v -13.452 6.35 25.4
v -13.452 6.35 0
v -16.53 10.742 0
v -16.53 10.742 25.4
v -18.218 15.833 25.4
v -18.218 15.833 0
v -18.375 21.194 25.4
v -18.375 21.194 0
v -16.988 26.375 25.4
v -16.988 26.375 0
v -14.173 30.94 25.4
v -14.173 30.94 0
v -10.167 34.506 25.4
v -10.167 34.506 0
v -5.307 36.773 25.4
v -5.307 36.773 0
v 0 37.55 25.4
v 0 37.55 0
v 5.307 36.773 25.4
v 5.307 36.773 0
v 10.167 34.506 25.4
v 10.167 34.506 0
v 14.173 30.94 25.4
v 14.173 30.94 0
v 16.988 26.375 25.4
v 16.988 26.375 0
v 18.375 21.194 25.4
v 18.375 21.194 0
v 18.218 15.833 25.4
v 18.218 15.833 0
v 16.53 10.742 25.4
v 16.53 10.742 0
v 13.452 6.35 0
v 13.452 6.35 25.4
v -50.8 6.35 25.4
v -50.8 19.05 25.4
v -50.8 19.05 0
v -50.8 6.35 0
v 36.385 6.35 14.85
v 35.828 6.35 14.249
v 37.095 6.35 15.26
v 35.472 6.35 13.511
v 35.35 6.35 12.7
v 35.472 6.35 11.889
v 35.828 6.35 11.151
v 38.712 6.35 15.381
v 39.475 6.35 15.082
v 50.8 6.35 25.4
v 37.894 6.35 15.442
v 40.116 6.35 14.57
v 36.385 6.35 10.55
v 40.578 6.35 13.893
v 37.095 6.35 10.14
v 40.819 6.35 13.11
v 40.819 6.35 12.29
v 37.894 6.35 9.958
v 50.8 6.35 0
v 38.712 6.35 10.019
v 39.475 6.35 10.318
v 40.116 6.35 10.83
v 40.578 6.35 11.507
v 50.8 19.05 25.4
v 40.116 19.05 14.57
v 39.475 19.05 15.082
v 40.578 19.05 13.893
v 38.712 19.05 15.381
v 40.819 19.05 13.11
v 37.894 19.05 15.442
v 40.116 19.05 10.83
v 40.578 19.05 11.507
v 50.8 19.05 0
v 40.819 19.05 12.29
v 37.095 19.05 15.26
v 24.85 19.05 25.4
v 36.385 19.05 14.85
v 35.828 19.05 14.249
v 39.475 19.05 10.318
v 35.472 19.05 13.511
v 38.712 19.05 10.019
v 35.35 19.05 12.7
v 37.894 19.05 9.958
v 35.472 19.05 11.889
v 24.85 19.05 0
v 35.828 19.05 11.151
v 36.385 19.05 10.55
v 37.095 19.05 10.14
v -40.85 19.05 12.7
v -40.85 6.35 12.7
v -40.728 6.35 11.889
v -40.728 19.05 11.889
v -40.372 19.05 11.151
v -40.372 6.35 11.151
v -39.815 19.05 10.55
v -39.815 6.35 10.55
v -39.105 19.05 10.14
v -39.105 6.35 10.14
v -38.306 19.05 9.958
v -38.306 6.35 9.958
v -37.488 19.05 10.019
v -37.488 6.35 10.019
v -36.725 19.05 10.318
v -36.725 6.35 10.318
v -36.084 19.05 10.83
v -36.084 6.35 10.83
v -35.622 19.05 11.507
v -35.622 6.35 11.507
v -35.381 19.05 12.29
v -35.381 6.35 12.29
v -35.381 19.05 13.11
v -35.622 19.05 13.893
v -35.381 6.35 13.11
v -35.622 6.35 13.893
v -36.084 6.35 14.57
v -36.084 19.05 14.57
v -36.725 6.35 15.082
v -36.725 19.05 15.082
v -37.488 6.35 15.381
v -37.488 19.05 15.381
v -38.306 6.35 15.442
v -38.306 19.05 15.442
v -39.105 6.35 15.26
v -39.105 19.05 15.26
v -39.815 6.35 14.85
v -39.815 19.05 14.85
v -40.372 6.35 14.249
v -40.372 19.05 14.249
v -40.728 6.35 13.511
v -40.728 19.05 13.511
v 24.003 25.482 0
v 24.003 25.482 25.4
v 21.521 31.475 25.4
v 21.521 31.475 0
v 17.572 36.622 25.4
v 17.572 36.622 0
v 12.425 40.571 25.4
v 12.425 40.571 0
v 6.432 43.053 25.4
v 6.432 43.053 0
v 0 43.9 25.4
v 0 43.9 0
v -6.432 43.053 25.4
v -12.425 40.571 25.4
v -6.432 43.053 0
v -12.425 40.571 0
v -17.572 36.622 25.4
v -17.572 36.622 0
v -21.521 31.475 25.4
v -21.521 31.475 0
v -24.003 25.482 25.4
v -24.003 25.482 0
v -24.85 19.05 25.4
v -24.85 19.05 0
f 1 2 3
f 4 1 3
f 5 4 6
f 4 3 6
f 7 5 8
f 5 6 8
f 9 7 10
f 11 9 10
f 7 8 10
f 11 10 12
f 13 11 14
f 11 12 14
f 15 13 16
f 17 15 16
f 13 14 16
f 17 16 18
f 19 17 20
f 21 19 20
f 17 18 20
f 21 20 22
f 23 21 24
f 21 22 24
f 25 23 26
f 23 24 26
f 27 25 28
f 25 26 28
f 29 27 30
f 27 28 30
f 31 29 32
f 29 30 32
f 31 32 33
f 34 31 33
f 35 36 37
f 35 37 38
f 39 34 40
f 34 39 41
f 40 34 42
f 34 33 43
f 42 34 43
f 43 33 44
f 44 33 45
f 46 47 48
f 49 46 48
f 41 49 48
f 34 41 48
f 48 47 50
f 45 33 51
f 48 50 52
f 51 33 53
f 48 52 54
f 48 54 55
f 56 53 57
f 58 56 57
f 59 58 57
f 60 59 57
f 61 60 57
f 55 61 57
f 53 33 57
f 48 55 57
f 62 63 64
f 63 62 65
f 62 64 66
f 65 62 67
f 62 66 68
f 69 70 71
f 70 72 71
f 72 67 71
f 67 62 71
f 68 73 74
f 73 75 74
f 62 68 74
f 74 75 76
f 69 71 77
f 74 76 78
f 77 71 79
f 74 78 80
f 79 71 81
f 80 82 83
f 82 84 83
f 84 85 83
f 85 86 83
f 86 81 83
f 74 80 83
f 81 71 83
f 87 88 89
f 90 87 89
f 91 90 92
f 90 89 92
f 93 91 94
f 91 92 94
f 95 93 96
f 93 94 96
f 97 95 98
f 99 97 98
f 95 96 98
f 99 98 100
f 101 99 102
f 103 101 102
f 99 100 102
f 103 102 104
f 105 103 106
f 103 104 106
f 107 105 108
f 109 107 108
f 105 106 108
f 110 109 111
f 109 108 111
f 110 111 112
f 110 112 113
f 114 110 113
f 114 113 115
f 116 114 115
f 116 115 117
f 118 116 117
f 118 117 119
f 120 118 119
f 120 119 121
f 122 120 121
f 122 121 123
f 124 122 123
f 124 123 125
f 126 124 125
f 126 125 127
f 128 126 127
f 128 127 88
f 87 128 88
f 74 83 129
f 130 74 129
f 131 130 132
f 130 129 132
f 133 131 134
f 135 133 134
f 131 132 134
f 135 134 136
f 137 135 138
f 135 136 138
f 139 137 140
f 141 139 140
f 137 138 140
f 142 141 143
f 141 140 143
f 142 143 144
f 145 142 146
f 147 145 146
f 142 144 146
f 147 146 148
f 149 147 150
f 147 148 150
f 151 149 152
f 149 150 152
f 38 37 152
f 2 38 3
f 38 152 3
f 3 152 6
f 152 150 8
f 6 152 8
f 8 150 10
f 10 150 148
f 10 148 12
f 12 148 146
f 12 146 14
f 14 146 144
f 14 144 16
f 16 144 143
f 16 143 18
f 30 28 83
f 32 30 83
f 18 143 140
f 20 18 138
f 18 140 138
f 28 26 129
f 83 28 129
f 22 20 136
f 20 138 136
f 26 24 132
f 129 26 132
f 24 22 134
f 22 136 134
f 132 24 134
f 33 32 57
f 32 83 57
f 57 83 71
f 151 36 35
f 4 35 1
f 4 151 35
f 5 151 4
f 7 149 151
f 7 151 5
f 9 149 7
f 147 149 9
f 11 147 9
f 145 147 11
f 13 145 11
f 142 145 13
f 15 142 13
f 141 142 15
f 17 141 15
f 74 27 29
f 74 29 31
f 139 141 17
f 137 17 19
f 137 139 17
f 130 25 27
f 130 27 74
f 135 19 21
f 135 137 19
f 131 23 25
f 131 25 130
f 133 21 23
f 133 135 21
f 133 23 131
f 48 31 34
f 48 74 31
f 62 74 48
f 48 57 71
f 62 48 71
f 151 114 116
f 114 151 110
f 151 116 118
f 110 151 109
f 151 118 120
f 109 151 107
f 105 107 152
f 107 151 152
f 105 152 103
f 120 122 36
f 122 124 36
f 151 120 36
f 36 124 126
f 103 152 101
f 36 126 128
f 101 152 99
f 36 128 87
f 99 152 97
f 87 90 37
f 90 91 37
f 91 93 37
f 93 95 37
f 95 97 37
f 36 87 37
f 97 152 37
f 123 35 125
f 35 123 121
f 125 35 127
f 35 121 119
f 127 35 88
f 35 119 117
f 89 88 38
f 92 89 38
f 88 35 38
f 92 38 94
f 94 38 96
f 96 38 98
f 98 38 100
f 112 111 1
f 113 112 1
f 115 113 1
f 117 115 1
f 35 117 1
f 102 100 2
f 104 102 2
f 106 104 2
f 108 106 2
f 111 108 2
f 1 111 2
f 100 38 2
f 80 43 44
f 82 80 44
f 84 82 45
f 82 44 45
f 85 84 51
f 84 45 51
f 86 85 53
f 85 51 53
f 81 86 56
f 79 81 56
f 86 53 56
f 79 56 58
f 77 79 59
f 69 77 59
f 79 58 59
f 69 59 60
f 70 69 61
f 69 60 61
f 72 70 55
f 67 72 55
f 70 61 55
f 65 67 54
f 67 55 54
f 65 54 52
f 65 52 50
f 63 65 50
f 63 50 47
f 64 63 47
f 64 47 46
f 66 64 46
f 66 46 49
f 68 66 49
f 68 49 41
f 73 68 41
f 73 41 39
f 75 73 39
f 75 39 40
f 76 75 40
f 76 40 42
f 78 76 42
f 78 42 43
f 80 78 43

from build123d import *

# Parameters (mm, degrees)
BOSS_EXTRUDE2_DEPTH  = 25.4
M5_CLEARANCE_HOLE2_D = 5.5


with BuildPart() as part:
    # Sketch1<3> → Boss-Extrude2 (new body)
    with BuildSketch(Plane.XY):
        with BuildLine():
            Line((13.452137377, 6.35), (50.8, 6.35))
            Line((50.8, 6.35), (50.8, 19.05))
            Line((50.8, 19.05), (24.85, 19.05))
            ThreePointArc((24.85, 19.05), (0, 43.9), (-24.85, 19.05))
            Line((-24.85, 19.05), (-50.8, 19.05))
            Line((-50.8, 19.05), (-50.8, 6.35))
            Line((-50.8, 6.35), (-13.452137377, 6.35))
            ThreePointArc((-13.452137377, 6.35), (0, 37.55), (13.452137377, 6.35))
        make_face()
    extrude(amount=BOSS_EXTRUDE2_DEPTH)

    # M5 Clearance Hole2 (through all)
    with Locations(Plane(origin=(0, 19.05, 0), x_dir=(1, 0, 0), z_dir=(0, 1, 0))):
        with Locations((38.1, -12.7), (-38.1, -12.7)):
            Hole(M5_CLEARANCE_HOLE2_D / 2)


solid = part.part
